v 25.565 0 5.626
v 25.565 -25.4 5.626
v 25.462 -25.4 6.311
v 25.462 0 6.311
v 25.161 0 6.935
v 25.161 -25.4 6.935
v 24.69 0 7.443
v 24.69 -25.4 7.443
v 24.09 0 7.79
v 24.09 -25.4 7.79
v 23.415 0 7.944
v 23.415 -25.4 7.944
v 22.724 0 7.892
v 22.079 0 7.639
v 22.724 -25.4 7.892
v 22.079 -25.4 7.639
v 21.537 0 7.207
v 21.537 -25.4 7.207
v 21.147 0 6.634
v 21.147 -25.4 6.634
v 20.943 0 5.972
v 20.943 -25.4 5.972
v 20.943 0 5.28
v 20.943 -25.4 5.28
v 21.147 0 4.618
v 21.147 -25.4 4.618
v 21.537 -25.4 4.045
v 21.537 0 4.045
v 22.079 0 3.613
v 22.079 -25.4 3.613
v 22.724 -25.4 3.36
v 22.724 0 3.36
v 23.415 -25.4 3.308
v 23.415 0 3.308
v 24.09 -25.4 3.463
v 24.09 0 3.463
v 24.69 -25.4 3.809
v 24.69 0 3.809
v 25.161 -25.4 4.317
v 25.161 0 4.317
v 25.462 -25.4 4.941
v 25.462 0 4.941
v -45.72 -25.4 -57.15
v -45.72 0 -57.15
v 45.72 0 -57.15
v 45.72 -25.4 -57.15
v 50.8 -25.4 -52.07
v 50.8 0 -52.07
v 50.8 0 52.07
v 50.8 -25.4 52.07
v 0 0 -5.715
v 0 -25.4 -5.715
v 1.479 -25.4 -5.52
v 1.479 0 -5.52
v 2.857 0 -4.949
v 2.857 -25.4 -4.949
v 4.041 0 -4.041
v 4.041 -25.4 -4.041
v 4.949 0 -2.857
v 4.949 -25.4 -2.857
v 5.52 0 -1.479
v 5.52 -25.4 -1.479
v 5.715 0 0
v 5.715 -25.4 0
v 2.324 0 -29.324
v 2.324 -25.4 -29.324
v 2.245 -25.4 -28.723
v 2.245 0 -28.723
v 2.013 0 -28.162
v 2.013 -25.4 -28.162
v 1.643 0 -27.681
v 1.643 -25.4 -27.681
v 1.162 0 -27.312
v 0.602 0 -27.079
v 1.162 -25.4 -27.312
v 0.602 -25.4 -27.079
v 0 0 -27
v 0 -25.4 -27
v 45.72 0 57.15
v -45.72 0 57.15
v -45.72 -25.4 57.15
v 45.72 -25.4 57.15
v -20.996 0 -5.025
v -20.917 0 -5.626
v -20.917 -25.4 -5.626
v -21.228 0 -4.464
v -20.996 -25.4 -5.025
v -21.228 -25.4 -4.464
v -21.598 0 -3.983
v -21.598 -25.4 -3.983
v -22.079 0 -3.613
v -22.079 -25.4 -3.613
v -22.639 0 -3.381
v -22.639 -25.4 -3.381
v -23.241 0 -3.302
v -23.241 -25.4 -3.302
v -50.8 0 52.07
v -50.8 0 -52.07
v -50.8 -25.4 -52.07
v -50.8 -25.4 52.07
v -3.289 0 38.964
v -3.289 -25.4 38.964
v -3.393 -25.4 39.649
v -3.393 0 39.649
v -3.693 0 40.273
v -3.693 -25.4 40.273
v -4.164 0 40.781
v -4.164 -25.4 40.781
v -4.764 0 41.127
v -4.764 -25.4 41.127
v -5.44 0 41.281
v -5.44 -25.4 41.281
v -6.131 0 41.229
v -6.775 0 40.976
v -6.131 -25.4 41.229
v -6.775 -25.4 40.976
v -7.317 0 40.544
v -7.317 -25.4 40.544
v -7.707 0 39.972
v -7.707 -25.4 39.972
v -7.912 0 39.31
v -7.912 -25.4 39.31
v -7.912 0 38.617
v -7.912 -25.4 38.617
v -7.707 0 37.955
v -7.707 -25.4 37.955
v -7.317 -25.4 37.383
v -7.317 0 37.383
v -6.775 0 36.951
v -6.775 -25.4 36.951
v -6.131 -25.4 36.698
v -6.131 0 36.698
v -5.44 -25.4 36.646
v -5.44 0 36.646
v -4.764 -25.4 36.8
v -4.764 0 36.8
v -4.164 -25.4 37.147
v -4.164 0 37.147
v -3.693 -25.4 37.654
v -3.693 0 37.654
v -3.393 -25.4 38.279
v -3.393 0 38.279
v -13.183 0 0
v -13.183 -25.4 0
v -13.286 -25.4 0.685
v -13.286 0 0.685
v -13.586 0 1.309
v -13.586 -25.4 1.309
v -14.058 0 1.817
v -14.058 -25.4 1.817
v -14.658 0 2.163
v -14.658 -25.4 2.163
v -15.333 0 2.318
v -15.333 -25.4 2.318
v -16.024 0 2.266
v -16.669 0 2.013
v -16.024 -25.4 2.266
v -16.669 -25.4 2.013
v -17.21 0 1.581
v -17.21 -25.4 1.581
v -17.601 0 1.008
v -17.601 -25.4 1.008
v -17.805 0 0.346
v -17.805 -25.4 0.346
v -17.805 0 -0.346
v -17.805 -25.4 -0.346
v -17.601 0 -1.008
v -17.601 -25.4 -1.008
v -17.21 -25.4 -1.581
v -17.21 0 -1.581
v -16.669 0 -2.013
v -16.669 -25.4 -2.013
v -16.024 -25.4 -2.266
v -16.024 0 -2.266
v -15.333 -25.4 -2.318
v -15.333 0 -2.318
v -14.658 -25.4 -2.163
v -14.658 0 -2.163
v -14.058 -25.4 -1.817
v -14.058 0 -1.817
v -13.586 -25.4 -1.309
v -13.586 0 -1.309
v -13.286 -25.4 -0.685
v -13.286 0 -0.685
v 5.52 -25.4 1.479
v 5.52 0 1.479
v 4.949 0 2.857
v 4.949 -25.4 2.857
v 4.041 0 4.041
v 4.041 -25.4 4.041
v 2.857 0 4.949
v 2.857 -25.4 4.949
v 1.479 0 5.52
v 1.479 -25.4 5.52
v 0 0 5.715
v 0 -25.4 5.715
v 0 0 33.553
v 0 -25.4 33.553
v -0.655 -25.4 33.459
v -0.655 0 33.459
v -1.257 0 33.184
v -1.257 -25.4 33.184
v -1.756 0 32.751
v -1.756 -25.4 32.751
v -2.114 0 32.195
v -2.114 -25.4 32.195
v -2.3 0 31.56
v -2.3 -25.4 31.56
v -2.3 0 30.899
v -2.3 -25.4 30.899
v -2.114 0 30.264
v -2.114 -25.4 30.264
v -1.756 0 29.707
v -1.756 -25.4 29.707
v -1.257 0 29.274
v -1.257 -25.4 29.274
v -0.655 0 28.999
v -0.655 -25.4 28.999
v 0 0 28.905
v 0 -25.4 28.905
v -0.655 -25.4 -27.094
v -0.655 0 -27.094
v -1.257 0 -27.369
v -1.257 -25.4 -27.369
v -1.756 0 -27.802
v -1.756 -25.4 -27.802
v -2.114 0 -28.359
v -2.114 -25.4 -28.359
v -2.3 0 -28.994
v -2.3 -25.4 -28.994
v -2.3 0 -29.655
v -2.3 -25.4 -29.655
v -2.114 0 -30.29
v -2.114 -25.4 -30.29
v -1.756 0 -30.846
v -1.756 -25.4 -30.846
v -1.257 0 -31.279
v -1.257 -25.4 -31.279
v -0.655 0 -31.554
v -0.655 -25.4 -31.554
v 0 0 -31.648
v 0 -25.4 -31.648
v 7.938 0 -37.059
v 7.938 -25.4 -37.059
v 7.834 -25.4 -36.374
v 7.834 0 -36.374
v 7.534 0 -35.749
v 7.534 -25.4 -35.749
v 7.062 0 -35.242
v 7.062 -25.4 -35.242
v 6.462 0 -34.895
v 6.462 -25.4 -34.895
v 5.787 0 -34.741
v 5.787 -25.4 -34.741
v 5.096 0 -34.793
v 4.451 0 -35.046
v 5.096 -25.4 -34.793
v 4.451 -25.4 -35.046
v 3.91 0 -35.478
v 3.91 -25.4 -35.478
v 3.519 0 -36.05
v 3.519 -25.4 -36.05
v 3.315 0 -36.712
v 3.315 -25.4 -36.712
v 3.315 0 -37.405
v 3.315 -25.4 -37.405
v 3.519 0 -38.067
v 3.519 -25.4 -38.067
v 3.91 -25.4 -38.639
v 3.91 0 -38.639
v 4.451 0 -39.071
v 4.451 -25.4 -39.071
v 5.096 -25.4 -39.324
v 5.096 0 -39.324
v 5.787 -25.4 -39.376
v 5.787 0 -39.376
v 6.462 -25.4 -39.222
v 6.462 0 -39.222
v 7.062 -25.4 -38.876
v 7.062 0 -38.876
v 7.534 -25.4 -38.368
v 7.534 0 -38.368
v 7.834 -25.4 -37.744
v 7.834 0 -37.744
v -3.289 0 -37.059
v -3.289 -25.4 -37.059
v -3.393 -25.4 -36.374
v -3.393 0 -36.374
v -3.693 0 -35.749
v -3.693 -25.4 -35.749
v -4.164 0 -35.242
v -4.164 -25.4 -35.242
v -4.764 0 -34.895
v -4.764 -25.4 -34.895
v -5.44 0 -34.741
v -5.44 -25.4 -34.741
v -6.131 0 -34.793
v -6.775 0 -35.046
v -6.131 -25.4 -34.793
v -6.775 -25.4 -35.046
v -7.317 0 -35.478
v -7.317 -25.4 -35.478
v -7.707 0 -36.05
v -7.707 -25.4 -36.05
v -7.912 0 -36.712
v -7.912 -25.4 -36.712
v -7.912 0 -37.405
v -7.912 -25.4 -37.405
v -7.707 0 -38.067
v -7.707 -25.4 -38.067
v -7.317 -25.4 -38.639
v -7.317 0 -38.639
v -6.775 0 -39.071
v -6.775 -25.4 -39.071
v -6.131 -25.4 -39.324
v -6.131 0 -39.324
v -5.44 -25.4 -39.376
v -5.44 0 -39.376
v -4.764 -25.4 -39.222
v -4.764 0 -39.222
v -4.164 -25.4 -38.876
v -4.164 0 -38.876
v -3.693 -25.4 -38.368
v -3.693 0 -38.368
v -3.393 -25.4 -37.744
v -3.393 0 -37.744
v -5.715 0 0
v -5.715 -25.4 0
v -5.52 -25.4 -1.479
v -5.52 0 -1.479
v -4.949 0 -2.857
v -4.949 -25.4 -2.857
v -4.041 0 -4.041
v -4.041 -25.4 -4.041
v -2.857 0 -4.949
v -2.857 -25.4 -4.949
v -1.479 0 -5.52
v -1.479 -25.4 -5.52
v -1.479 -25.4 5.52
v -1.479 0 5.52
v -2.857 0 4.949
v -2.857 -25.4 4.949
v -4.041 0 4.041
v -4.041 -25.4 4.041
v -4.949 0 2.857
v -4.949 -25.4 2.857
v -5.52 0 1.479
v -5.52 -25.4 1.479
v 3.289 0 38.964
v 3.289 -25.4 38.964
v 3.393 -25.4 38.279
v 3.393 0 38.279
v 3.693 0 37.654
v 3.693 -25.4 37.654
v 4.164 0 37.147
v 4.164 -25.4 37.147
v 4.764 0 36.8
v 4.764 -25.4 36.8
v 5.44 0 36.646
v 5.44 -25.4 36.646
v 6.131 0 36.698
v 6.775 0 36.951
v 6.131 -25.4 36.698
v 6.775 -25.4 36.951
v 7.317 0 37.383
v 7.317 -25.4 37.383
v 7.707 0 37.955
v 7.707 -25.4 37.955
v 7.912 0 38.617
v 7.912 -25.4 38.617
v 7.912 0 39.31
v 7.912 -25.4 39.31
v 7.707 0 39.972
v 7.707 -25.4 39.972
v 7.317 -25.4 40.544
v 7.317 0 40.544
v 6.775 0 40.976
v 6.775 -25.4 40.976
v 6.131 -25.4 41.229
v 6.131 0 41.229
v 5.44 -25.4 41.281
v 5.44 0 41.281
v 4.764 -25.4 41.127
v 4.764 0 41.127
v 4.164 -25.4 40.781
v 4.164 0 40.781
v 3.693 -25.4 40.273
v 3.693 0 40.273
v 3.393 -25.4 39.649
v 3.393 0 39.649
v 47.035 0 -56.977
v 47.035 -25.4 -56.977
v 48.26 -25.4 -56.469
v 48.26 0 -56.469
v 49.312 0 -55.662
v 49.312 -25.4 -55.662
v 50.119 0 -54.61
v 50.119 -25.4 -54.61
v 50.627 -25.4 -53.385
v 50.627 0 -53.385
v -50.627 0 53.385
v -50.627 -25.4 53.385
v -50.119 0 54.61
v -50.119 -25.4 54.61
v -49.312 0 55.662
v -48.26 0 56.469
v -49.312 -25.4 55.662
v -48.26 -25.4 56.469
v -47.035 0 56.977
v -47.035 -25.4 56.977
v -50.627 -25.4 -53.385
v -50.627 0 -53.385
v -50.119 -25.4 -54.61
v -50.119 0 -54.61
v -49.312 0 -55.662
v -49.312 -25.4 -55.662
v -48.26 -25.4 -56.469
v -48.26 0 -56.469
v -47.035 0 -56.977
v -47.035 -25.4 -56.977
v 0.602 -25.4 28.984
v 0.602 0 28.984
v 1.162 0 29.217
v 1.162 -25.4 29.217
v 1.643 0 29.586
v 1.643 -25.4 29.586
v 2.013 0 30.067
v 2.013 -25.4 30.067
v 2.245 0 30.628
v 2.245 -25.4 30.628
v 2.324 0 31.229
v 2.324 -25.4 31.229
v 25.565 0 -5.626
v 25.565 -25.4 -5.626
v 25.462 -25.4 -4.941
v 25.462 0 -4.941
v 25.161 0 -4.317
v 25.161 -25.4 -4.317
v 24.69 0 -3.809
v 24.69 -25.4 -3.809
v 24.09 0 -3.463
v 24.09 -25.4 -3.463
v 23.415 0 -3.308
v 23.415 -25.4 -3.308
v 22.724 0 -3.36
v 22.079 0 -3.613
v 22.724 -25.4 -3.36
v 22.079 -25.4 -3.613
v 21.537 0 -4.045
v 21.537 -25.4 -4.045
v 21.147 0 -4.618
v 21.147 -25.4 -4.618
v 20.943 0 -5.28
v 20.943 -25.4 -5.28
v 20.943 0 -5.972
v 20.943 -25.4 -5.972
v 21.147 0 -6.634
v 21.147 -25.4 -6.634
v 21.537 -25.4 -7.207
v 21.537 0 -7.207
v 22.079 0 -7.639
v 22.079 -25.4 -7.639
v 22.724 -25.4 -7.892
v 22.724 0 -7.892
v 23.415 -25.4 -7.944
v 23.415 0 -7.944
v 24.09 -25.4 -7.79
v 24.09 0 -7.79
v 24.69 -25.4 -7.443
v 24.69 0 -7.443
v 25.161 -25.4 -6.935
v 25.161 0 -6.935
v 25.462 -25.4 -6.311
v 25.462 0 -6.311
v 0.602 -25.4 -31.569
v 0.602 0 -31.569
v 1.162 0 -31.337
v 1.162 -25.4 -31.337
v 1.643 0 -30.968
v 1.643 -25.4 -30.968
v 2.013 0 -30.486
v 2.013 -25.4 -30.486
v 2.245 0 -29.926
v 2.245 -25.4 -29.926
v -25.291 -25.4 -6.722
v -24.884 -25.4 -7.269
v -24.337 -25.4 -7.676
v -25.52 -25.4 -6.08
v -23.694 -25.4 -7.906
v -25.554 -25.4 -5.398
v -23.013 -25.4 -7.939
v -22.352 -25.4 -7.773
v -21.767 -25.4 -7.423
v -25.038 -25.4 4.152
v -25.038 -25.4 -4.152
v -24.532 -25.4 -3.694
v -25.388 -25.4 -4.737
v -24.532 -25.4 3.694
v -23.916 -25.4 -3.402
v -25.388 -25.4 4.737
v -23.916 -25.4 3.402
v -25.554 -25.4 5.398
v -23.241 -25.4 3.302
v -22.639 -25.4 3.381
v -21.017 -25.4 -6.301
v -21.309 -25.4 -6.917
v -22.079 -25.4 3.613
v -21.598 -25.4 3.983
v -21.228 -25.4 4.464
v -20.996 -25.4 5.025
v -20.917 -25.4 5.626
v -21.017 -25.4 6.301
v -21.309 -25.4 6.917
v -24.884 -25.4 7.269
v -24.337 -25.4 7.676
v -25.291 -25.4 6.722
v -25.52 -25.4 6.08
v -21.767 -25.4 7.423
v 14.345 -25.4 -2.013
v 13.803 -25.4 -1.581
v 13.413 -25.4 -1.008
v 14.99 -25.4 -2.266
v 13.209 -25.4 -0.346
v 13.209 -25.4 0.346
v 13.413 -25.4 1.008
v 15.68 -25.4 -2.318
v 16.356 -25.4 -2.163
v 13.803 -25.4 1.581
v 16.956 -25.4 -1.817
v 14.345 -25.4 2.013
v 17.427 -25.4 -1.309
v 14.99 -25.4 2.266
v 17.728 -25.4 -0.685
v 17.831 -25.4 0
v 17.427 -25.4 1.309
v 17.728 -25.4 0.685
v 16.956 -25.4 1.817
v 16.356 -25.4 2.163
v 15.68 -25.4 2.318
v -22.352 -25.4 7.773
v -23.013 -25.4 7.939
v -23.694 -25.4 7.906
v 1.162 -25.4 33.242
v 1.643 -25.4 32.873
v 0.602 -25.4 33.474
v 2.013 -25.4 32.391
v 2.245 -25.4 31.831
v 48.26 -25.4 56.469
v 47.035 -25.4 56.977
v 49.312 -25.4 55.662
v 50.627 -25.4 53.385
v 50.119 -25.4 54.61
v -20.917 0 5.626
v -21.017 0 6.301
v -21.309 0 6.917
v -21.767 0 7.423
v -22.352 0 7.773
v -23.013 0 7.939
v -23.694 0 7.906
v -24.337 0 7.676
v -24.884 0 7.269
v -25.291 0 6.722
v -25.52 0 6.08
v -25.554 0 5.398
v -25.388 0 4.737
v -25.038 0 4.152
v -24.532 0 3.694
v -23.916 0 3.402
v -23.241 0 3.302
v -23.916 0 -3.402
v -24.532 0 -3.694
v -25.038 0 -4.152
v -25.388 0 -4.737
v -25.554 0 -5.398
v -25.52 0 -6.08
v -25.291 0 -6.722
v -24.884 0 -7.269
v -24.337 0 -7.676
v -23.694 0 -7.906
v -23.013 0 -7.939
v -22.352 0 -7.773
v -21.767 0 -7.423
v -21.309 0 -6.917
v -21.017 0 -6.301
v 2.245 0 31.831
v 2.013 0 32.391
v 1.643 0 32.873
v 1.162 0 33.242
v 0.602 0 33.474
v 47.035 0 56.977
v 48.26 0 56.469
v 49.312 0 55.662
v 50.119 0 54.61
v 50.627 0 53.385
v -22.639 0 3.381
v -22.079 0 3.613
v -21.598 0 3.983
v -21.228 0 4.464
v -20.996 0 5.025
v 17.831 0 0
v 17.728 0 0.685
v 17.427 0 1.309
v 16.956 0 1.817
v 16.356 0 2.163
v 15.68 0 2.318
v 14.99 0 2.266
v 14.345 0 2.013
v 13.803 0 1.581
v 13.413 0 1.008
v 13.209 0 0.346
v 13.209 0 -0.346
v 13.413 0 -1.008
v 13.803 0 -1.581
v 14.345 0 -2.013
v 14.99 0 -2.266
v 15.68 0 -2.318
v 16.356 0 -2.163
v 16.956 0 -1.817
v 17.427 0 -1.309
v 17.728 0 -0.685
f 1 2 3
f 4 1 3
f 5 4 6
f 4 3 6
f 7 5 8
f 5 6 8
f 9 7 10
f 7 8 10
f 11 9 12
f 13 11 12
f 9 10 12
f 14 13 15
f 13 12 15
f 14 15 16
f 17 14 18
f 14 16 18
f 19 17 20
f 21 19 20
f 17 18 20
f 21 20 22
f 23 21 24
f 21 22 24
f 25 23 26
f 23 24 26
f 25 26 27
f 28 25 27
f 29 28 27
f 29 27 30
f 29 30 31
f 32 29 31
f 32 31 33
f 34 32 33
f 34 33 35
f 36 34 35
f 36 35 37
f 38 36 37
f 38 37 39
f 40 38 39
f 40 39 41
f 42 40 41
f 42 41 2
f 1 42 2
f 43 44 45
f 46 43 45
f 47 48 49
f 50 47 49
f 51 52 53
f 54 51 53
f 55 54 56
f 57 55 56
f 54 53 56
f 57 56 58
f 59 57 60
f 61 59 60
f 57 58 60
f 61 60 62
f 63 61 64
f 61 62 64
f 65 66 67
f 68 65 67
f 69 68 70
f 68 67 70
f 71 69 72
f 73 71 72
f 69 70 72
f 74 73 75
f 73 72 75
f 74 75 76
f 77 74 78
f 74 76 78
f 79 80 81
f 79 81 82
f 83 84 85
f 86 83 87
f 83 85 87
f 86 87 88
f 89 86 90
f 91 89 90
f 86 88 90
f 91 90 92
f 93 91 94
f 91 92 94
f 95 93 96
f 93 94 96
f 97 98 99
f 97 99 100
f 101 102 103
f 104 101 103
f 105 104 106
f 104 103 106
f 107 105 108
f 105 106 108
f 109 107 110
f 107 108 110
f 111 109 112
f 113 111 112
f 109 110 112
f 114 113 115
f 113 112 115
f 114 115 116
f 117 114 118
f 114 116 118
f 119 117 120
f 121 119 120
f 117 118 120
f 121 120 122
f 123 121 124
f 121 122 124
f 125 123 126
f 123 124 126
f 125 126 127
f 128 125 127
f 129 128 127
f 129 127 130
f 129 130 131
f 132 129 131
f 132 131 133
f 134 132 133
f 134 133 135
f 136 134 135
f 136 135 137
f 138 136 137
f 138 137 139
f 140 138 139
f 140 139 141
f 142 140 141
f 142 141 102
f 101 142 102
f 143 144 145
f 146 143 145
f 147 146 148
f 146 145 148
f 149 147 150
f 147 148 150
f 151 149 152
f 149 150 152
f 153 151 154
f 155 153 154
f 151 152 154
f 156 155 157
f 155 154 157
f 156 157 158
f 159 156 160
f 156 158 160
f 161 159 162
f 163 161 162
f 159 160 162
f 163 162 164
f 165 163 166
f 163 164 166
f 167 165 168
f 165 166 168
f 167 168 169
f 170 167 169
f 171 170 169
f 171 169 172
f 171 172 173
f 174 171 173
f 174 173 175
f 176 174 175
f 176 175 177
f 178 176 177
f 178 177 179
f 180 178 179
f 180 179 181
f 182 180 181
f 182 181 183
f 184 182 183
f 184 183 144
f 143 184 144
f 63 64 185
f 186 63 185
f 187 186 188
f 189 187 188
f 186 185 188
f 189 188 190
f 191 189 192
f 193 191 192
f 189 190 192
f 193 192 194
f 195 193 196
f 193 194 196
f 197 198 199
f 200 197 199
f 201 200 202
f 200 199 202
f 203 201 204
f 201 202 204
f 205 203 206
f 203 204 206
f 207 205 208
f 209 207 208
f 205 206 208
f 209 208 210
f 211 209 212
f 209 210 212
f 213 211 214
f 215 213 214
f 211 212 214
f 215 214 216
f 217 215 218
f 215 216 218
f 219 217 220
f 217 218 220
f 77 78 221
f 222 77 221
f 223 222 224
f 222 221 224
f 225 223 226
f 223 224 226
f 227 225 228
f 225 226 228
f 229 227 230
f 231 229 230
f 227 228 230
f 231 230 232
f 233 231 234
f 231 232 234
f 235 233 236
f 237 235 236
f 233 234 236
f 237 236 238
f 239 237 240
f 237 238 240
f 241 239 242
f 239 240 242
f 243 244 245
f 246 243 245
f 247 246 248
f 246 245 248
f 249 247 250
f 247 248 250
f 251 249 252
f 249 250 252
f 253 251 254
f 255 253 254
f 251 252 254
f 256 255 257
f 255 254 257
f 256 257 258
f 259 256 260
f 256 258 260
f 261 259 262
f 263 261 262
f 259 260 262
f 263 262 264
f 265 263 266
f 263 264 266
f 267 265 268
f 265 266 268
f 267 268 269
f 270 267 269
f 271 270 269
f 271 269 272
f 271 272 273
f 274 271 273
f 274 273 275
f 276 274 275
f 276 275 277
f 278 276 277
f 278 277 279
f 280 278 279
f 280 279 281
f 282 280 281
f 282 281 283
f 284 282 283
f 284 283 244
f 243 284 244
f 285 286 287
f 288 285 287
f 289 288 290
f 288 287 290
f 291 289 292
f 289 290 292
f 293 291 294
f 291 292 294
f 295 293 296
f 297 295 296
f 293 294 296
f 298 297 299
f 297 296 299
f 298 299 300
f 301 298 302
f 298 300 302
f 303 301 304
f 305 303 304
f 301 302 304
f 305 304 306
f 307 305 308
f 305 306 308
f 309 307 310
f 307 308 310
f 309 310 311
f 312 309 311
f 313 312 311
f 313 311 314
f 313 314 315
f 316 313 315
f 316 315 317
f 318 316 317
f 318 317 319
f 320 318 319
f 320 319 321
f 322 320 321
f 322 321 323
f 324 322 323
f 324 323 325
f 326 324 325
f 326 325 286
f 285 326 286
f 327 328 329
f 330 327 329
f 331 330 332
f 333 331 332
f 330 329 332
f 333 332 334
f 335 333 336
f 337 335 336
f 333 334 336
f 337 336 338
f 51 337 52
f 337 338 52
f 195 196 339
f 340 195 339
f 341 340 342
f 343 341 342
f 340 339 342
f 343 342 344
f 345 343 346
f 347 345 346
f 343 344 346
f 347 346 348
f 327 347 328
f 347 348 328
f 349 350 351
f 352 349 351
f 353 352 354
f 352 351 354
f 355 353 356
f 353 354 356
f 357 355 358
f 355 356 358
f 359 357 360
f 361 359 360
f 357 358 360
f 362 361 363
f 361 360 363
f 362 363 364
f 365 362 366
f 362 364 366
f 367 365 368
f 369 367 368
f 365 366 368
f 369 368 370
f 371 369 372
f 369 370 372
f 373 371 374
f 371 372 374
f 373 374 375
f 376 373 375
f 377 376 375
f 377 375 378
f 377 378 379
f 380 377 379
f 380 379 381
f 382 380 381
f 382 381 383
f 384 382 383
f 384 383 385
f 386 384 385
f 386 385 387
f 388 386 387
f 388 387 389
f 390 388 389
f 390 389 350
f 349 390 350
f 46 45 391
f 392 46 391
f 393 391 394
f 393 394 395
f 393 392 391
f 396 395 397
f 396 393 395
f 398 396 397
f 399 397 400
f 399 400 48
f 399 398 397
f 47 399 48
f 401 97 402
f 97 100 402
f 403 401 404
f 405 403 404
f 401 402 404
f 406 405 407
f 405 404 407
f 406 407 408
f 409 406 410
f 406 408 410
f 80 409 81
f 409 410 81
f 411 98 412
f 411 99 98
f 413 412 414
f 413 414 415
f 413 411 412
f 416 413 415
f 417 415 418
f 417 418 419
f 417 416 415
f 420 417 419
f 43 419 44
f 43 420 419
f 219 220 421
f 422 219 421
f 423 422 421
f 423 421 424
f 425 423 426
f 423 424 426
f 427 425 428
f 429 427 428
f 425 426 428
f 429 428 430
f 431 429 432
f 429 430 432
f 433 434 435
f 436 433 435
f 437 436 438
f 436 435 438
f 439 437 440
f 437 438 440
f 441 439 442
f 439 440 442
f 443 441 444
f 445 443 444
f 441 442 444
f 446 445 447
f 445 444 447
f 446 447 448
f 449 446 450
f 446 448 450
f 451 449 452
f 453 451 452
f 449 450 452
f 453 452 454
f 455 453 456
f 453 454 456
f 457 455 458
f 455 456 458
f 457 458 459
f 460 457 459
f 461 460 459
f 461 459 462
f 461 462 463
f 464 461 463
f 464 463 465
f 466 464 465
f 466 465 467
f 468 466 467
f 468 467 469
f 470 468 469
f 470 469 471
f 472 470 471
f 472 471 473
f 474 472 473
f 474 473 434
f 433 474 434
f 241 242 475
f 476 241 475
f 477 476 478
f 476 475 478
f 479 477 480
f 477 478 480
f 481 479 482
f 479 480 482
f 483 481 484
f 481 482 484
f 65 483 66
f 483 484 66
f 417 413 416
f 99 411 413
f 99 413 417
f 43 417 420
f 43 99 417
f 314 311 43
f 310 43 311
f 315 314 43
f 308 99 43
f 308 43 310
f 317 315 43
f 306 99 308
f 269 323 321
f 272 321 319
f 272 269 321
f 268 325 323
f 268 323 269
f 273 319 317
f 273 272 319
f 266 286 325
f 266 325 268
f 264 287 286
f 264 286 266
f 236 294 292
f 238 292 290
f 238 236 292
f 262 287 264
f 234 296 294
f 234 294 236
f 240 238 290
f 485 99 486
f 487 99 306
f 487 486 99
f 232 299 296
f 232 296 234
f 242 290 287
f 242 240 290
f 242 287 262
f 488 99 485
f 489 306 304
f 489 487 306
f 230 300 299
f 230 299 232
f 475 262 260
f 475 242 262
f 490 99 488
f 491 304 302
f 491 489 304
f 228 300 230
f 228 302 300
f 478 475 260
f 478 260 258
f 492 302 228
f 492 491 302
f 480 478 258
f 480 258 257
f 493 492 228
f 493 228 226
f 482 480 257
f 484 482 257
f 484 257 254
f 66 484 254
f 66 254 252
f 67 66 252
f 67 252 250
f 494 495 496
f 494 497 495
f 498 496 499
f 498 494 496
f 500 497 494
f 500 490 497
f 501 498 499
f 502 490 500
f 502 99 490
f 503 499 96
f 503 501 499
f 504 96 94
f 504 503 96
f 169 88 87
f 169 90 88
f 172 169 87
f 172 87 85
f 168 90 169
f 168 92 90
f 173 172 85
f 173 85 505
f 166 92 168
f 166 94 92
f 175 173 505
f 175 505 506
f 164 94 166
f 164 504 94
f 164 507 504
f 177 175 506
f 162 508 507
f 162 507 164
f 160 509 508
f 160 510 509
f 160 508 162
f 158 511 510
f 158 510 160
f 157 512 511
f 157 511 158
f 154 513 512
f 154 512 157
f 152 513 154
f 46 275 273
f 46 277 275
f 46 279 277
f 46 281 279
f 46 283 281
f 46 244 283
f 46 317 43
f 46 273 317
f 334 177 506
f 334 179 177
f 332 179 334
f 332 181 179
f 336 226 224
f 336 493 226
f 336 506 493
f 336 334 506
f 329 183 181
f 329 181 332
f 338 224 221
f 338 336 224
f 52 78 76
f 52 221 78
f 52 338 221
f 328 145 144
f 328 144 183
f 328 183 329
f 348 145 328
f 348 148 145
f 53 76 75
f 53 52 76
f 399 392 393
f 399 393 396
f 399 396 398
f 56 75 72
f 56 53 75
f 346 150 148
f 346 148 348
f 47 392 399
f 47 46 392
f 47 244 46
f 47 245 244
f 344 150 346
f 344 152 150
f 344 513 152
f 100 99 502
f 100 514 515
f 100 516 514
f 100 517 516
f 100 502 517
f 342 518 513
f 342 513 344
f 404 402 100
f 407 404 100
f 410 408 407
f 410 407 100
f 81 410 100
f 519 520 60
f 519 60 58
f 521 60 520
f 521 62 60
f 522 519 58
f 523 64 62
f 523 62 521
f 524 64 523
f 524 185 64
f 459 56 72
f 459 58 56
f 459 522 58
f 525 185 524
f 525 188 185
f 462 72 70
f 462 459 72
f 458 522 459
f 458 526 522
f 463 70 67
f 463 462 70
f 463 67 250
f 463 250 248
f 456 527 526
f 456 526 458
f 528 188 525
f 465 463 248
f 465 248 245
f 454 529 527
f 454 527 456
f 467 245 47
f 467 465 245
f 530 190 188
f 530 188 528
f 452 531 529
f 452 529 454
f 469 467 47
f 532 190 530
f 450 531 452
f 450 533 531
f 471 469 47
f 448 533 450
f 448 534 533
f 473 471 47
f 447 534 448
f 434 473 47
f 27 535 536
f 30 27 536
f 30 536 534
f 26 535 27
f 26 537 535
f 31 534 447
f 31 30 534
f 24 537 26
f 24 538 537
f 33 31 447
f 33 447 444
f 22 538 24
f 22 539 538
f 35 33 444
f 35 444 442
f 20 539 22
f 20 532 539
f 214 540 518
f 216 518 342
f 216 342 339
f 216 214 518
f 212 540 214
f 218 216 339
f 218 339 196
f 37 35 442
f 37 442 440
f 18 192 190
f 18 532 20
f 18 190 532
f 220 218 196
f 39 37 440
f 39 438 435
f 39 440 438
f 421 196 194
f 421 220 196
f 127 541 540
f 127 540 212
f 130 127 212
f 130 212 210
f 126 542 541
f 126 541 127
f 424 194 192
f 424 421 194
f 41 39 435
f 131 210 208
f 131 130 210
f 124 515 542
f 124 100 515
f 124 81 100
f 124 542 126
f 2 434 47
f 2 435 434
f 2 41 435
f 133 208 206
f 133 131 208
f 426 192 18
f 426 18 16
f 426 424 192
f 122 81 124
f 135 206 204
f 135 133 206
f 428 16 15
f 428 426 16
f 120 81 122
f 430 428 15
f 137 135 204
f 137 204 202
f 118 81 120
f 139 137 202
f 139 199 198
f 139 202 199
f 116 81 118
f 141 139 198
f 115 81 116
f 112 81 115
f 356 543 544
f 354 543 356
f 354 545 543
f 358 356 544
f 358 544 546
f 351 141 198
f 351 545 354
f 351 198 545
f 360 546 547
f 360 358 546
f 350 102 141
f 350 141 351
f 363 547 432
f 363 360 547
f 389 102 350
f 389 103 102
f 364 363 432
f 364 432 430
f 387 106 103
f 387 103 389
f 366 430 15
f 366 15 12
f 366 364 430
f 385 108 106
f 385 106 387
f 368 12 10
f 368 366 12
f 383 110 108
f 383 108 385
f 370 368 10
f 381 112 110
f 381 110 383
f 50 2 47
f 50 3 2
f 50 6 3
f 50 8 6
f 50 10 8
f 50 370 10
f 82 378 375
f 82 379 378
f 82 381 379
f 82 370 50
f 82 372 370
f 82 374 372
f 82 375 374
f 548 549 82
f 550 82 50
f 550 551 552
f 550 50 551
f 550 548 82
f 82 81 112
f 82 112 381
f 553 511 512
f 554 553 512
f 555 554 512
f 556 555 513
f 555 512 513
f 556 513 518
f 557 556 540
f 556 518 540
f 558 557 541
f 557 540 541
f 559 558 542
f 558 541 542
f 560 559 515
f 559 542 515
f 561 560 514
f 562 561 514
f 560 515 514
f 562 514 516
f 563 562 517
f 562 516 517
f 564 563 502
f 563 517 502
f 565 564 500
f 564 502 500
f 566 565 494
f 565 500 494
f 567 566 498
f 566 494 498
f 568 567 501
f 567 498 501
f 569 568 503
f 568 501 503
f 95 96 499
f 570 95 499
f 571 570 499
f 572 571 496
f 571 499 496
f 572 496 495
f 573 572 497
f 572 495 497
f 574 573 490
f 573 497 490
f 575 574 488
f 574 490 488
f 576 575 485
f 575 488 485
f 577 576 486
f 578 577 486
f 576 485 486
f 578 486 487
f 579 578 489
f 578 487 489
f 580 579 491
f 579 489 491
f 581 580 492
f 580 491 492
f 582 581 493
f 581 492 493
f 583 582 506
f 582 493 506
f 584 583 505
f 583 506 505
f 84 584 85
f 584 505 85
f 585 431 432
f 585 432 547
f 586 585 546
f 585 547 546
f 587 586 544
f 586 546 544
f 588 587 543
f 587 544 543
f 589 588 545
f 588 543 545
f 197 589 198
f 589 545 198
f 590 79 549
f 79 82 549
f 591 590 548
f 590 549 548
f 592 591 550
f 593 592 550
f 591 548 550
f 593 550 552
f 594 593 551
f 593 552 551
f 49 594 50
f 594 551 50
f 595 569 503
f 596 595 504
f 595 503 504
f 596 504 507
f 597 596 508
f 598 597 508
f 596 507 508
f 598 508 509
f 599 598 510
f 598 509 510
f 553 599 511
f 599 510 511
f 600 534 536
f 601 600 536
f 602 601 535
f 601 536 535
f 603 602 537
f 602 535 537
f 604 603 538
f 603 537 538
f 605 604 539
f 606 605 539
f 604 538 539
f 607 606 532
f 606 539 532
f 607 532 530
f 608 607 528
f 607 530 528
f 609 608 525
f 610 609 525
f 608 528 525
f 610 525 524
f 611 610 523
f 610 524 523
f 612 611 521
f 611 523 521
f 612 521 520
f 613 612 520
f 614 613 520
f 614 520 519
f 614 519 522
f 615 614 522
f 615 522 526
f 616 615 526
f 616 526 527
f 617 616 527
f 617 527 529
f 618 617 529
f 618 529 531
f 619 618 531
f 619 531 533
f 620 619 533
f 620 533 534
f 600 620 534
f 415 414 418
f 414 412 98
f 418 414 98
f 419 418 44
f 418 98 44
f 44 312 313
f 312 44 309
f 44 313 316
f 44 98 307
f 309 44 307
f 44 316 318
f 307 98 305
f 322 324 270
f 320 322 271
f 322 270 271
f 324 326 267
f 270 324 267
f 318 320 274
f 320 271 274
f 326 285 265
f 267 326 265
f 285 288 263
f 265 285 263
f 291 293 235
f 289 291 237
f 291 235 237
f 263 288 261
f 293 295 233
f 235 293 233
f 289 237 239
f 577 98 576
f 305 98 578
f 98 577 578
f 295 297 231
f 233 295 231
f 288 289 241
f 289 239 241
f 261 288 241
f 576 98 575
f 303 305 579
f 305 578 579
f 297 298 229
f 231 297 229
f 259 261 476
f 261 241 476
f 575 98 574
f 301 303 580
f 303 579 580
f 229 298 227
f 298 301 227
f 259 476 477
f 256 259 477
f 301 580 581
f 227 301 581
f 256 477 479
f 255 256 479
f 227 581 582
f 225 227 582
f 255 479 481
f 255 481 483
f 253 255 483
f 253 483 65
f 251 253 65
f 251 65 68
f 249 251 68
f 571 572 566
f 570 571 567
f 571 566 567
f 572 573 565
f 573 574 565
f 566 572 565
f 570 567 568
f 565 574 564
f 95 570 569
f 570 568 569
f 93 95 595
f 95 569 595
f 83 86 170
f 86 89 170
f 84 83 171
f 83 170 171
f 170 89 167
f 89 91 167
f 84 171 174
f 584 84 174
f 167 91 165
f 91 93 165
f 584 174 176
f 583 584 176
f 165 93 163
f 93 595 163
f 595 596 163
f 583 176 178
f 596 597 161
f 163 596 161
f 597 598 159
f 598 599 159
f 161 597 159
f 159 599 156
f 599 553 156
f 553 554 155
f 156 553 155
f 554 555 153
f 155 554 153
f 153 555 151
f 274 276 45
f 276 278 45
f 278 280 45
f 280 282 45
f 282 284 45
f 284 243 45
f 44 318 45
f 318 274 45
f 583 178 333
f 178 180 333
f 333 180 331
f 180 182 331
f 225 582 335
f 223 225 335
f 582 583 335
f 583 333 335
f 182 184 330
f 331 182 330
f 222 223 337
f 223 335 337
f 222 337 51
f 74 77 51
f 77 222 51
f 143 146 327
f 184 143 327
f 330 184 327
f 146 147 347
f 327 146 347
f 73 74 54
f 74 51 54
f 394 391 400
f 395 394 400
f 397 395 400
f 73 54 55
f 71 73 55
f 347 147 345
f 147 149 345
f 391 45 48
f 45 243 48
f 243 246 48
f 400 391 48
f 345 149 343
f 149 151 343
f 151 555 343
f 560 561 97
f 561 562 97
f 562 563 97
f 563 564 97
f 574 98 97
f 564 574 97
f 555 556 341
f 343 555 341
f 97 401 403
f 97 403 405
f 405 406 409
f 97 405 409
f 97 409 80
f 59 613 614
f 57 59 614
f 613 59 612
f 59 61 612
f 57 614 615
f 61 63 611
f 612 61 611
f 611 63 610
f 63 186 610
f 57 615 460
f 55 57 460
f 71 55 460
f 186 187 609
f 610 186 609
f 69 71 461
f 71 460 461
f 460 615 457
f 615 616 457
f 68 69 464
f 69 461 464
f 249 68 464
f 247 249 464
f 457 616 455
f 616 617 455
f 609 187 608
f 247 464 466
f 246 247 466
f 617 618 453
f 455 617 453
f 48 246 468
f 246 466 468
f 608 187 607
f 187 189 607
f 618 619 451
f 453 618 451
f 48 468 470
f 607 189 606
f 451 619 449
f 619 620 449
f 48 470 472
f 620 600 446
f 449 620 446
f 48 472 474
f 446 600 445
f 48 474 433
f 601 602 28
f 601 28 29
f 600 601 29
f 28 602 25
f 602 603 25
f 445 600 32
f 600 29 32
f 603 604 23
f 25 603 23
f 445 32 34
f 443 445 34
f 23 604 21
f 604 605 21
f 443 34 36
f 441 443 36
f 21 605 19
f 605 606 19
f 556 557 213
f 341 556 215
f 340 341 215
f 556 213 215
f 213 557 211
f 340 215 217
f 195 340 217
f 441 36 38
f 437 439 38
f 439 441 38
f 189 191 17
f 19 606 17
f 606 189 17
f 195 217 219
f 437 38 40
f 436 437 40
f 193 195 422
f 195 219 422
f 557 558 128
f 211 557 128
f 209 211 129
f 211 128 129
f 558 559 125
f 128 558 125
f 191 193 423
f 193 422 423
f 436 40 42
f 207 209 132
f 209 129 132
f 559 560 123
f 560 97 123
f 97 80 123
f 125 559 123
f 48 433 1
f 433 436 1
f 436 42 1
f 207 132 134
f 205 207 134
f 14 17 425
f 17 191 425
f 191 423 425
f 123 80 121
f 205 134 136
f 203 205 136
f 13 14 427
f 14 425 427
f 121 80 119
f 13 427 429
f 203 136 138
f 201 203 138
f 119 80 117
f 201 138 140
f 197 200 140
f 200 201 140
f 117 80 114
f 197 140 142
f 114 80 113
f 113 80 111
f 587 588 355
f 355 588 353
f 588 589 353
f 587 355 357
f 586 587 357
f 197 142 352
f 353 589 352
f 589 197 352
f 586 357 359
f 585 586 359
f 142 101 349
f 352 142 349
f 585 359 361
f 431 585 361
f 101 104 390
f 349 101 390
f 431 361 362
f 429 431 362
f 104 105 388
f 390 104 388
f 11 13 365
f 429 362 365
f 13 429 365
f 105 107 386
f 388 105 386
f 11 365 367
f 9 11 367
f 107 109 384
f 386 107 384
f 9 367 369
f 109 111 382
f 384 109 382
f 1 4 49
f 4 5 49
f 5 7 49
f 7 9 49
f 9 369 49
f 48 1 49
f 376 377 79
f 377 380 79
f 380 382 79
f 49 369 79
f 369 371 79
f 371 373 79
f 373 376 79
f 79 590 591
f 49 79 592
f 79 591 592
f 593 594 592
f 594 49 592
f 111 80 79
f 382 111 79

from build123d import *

# Parameters (mm, degrees)
F0_W     = 101.6
F0_H     = 114.3
F1_DEPTH = 25.4
F2_R     = 2.3241
F3_DEPTH = 25.401
F4_R     = 5.08


with BuildPart() as f1:
    # F0 (on Front) → F1 (new body)
    with BuildSketch(Plane.XZ):
        Rectangle(F0_W, F0_H)
    extrude(amount=F1_DEPTH)

    # F2 (on face) → F3 (cut, through all)
    with BuildSketch(Plane.XZ.offset(25.4)):
        with BuildLine():
            ThreePointArc((0, -5.715), (4.041115, -4.041115), (5.715, 0))
            ThreePointArc((5.715, 0), (4.041115, 4.041115), (0, 5.715))
            ThreePointArc((0, 5.715), (-4.041115, 4.041115), (-5.715, 0))
            ThreePointArc((-5.715, 0), (-4.041115, -4.041115), (0, -5.715))
        make_face()
        with BuildLine():
            ThreePointArc((2.3241, -29.3243), (1.643387, -27.680913), (0, -27.0002))
            Line((0, -27.0002), (0, -31.6484))
            ThreePointArc((0, -31.6484), (1.643387, -30.967687), (2.3241, -29.3243))
        make_face()
        with BuildLine():
            Line((0, -31.6484), (0, -27.0002))
            ThreePointArc((0, -27.0002), (-2.3241, -29.3243), (0, -31.6484))
        make_face()
        with BuildLine():
            ThreePointArc((-20.9169, -5.6261), (-21.597613, -3.982713), (-23.241, -3.302))
            ThreePointArc((-23.241, -3.302), (-24.884387, -7.269487), (-20.9169, -5.6261))
        make_face()
        with BuildLine():
            ThreePointArc((-20.9169, 5.6261), (-24.884387, 7.269487), (-23.241, 3.302))
            ThreePointArc((-23.241, 3.302), (-21.597613, 3.982713), (-20.9169, 5.6261))
        make_face()
        with BuildLine():
            ThreePointArc((-17.8308, 0), (-15.5067, -2.3241), (-13.1826, 0))
            ThreePointArc((-13.1826, 0), (-15.5067, 2.3241), (-17.8308, 0))
        make_face()
        with Locations((-5.6134, 38.9636)):
            Circle(F2_R)
        with BuildLine():
            ThreePointArc((7.9375, 38.9636), (5.6134, 41.2877), (3.2893, 38.9636))
            ThreePointArc((3.2893, 38.9636), (5.6134, 36.6395), (7.9375, 38.9636))
        make_face()
        with BuildLine():
            ThreePointArc((0, 33.5534), (-2.3241, 31.2293), (0, 28.9052))
            Line((0, 28.9052), (0, 33.5534))
        make_face()
        with BuildLine():
            Line((0, 33.5534), (0, 28.9052))
            ThreePointArc((0, 28.9052), (1.643387, 29.585913), (2.3241, 31.2293))
            ThreePointArc((2.3241, 31.2293), (1.643387, 32.872687), (0, 33.5534))
        make_face()
        with Locations((-5.6134, -37.0586)):
            Circle(F2_R)
        with Locations((5.6134, -37.0586)):
            Circle(F2_R)
        with Locations((15.5067, 0)):
            Circle(F2_R)
        with Locations((23.241, -5.6261)):
            Circle(F2_R)
        with Locations((23.241, 5.6261)):
            Circle(F2_R)
    extrude(amount=-F3_DEPTH, mode=Mode.SUBTRACT)

    # F4
    f4_edges = [f1.edges().sort_by_distance(p)[0] for p in [
        (-50.8, -12.7, -57.15),
        (50.8, -12.7, -57.15),
        (-50.8, -12.7, 57.15),
        (50.8, -12.7, 57.15),
    ]]
    fillet(f4_edges, radius=F4_R)


solid = f1.part
